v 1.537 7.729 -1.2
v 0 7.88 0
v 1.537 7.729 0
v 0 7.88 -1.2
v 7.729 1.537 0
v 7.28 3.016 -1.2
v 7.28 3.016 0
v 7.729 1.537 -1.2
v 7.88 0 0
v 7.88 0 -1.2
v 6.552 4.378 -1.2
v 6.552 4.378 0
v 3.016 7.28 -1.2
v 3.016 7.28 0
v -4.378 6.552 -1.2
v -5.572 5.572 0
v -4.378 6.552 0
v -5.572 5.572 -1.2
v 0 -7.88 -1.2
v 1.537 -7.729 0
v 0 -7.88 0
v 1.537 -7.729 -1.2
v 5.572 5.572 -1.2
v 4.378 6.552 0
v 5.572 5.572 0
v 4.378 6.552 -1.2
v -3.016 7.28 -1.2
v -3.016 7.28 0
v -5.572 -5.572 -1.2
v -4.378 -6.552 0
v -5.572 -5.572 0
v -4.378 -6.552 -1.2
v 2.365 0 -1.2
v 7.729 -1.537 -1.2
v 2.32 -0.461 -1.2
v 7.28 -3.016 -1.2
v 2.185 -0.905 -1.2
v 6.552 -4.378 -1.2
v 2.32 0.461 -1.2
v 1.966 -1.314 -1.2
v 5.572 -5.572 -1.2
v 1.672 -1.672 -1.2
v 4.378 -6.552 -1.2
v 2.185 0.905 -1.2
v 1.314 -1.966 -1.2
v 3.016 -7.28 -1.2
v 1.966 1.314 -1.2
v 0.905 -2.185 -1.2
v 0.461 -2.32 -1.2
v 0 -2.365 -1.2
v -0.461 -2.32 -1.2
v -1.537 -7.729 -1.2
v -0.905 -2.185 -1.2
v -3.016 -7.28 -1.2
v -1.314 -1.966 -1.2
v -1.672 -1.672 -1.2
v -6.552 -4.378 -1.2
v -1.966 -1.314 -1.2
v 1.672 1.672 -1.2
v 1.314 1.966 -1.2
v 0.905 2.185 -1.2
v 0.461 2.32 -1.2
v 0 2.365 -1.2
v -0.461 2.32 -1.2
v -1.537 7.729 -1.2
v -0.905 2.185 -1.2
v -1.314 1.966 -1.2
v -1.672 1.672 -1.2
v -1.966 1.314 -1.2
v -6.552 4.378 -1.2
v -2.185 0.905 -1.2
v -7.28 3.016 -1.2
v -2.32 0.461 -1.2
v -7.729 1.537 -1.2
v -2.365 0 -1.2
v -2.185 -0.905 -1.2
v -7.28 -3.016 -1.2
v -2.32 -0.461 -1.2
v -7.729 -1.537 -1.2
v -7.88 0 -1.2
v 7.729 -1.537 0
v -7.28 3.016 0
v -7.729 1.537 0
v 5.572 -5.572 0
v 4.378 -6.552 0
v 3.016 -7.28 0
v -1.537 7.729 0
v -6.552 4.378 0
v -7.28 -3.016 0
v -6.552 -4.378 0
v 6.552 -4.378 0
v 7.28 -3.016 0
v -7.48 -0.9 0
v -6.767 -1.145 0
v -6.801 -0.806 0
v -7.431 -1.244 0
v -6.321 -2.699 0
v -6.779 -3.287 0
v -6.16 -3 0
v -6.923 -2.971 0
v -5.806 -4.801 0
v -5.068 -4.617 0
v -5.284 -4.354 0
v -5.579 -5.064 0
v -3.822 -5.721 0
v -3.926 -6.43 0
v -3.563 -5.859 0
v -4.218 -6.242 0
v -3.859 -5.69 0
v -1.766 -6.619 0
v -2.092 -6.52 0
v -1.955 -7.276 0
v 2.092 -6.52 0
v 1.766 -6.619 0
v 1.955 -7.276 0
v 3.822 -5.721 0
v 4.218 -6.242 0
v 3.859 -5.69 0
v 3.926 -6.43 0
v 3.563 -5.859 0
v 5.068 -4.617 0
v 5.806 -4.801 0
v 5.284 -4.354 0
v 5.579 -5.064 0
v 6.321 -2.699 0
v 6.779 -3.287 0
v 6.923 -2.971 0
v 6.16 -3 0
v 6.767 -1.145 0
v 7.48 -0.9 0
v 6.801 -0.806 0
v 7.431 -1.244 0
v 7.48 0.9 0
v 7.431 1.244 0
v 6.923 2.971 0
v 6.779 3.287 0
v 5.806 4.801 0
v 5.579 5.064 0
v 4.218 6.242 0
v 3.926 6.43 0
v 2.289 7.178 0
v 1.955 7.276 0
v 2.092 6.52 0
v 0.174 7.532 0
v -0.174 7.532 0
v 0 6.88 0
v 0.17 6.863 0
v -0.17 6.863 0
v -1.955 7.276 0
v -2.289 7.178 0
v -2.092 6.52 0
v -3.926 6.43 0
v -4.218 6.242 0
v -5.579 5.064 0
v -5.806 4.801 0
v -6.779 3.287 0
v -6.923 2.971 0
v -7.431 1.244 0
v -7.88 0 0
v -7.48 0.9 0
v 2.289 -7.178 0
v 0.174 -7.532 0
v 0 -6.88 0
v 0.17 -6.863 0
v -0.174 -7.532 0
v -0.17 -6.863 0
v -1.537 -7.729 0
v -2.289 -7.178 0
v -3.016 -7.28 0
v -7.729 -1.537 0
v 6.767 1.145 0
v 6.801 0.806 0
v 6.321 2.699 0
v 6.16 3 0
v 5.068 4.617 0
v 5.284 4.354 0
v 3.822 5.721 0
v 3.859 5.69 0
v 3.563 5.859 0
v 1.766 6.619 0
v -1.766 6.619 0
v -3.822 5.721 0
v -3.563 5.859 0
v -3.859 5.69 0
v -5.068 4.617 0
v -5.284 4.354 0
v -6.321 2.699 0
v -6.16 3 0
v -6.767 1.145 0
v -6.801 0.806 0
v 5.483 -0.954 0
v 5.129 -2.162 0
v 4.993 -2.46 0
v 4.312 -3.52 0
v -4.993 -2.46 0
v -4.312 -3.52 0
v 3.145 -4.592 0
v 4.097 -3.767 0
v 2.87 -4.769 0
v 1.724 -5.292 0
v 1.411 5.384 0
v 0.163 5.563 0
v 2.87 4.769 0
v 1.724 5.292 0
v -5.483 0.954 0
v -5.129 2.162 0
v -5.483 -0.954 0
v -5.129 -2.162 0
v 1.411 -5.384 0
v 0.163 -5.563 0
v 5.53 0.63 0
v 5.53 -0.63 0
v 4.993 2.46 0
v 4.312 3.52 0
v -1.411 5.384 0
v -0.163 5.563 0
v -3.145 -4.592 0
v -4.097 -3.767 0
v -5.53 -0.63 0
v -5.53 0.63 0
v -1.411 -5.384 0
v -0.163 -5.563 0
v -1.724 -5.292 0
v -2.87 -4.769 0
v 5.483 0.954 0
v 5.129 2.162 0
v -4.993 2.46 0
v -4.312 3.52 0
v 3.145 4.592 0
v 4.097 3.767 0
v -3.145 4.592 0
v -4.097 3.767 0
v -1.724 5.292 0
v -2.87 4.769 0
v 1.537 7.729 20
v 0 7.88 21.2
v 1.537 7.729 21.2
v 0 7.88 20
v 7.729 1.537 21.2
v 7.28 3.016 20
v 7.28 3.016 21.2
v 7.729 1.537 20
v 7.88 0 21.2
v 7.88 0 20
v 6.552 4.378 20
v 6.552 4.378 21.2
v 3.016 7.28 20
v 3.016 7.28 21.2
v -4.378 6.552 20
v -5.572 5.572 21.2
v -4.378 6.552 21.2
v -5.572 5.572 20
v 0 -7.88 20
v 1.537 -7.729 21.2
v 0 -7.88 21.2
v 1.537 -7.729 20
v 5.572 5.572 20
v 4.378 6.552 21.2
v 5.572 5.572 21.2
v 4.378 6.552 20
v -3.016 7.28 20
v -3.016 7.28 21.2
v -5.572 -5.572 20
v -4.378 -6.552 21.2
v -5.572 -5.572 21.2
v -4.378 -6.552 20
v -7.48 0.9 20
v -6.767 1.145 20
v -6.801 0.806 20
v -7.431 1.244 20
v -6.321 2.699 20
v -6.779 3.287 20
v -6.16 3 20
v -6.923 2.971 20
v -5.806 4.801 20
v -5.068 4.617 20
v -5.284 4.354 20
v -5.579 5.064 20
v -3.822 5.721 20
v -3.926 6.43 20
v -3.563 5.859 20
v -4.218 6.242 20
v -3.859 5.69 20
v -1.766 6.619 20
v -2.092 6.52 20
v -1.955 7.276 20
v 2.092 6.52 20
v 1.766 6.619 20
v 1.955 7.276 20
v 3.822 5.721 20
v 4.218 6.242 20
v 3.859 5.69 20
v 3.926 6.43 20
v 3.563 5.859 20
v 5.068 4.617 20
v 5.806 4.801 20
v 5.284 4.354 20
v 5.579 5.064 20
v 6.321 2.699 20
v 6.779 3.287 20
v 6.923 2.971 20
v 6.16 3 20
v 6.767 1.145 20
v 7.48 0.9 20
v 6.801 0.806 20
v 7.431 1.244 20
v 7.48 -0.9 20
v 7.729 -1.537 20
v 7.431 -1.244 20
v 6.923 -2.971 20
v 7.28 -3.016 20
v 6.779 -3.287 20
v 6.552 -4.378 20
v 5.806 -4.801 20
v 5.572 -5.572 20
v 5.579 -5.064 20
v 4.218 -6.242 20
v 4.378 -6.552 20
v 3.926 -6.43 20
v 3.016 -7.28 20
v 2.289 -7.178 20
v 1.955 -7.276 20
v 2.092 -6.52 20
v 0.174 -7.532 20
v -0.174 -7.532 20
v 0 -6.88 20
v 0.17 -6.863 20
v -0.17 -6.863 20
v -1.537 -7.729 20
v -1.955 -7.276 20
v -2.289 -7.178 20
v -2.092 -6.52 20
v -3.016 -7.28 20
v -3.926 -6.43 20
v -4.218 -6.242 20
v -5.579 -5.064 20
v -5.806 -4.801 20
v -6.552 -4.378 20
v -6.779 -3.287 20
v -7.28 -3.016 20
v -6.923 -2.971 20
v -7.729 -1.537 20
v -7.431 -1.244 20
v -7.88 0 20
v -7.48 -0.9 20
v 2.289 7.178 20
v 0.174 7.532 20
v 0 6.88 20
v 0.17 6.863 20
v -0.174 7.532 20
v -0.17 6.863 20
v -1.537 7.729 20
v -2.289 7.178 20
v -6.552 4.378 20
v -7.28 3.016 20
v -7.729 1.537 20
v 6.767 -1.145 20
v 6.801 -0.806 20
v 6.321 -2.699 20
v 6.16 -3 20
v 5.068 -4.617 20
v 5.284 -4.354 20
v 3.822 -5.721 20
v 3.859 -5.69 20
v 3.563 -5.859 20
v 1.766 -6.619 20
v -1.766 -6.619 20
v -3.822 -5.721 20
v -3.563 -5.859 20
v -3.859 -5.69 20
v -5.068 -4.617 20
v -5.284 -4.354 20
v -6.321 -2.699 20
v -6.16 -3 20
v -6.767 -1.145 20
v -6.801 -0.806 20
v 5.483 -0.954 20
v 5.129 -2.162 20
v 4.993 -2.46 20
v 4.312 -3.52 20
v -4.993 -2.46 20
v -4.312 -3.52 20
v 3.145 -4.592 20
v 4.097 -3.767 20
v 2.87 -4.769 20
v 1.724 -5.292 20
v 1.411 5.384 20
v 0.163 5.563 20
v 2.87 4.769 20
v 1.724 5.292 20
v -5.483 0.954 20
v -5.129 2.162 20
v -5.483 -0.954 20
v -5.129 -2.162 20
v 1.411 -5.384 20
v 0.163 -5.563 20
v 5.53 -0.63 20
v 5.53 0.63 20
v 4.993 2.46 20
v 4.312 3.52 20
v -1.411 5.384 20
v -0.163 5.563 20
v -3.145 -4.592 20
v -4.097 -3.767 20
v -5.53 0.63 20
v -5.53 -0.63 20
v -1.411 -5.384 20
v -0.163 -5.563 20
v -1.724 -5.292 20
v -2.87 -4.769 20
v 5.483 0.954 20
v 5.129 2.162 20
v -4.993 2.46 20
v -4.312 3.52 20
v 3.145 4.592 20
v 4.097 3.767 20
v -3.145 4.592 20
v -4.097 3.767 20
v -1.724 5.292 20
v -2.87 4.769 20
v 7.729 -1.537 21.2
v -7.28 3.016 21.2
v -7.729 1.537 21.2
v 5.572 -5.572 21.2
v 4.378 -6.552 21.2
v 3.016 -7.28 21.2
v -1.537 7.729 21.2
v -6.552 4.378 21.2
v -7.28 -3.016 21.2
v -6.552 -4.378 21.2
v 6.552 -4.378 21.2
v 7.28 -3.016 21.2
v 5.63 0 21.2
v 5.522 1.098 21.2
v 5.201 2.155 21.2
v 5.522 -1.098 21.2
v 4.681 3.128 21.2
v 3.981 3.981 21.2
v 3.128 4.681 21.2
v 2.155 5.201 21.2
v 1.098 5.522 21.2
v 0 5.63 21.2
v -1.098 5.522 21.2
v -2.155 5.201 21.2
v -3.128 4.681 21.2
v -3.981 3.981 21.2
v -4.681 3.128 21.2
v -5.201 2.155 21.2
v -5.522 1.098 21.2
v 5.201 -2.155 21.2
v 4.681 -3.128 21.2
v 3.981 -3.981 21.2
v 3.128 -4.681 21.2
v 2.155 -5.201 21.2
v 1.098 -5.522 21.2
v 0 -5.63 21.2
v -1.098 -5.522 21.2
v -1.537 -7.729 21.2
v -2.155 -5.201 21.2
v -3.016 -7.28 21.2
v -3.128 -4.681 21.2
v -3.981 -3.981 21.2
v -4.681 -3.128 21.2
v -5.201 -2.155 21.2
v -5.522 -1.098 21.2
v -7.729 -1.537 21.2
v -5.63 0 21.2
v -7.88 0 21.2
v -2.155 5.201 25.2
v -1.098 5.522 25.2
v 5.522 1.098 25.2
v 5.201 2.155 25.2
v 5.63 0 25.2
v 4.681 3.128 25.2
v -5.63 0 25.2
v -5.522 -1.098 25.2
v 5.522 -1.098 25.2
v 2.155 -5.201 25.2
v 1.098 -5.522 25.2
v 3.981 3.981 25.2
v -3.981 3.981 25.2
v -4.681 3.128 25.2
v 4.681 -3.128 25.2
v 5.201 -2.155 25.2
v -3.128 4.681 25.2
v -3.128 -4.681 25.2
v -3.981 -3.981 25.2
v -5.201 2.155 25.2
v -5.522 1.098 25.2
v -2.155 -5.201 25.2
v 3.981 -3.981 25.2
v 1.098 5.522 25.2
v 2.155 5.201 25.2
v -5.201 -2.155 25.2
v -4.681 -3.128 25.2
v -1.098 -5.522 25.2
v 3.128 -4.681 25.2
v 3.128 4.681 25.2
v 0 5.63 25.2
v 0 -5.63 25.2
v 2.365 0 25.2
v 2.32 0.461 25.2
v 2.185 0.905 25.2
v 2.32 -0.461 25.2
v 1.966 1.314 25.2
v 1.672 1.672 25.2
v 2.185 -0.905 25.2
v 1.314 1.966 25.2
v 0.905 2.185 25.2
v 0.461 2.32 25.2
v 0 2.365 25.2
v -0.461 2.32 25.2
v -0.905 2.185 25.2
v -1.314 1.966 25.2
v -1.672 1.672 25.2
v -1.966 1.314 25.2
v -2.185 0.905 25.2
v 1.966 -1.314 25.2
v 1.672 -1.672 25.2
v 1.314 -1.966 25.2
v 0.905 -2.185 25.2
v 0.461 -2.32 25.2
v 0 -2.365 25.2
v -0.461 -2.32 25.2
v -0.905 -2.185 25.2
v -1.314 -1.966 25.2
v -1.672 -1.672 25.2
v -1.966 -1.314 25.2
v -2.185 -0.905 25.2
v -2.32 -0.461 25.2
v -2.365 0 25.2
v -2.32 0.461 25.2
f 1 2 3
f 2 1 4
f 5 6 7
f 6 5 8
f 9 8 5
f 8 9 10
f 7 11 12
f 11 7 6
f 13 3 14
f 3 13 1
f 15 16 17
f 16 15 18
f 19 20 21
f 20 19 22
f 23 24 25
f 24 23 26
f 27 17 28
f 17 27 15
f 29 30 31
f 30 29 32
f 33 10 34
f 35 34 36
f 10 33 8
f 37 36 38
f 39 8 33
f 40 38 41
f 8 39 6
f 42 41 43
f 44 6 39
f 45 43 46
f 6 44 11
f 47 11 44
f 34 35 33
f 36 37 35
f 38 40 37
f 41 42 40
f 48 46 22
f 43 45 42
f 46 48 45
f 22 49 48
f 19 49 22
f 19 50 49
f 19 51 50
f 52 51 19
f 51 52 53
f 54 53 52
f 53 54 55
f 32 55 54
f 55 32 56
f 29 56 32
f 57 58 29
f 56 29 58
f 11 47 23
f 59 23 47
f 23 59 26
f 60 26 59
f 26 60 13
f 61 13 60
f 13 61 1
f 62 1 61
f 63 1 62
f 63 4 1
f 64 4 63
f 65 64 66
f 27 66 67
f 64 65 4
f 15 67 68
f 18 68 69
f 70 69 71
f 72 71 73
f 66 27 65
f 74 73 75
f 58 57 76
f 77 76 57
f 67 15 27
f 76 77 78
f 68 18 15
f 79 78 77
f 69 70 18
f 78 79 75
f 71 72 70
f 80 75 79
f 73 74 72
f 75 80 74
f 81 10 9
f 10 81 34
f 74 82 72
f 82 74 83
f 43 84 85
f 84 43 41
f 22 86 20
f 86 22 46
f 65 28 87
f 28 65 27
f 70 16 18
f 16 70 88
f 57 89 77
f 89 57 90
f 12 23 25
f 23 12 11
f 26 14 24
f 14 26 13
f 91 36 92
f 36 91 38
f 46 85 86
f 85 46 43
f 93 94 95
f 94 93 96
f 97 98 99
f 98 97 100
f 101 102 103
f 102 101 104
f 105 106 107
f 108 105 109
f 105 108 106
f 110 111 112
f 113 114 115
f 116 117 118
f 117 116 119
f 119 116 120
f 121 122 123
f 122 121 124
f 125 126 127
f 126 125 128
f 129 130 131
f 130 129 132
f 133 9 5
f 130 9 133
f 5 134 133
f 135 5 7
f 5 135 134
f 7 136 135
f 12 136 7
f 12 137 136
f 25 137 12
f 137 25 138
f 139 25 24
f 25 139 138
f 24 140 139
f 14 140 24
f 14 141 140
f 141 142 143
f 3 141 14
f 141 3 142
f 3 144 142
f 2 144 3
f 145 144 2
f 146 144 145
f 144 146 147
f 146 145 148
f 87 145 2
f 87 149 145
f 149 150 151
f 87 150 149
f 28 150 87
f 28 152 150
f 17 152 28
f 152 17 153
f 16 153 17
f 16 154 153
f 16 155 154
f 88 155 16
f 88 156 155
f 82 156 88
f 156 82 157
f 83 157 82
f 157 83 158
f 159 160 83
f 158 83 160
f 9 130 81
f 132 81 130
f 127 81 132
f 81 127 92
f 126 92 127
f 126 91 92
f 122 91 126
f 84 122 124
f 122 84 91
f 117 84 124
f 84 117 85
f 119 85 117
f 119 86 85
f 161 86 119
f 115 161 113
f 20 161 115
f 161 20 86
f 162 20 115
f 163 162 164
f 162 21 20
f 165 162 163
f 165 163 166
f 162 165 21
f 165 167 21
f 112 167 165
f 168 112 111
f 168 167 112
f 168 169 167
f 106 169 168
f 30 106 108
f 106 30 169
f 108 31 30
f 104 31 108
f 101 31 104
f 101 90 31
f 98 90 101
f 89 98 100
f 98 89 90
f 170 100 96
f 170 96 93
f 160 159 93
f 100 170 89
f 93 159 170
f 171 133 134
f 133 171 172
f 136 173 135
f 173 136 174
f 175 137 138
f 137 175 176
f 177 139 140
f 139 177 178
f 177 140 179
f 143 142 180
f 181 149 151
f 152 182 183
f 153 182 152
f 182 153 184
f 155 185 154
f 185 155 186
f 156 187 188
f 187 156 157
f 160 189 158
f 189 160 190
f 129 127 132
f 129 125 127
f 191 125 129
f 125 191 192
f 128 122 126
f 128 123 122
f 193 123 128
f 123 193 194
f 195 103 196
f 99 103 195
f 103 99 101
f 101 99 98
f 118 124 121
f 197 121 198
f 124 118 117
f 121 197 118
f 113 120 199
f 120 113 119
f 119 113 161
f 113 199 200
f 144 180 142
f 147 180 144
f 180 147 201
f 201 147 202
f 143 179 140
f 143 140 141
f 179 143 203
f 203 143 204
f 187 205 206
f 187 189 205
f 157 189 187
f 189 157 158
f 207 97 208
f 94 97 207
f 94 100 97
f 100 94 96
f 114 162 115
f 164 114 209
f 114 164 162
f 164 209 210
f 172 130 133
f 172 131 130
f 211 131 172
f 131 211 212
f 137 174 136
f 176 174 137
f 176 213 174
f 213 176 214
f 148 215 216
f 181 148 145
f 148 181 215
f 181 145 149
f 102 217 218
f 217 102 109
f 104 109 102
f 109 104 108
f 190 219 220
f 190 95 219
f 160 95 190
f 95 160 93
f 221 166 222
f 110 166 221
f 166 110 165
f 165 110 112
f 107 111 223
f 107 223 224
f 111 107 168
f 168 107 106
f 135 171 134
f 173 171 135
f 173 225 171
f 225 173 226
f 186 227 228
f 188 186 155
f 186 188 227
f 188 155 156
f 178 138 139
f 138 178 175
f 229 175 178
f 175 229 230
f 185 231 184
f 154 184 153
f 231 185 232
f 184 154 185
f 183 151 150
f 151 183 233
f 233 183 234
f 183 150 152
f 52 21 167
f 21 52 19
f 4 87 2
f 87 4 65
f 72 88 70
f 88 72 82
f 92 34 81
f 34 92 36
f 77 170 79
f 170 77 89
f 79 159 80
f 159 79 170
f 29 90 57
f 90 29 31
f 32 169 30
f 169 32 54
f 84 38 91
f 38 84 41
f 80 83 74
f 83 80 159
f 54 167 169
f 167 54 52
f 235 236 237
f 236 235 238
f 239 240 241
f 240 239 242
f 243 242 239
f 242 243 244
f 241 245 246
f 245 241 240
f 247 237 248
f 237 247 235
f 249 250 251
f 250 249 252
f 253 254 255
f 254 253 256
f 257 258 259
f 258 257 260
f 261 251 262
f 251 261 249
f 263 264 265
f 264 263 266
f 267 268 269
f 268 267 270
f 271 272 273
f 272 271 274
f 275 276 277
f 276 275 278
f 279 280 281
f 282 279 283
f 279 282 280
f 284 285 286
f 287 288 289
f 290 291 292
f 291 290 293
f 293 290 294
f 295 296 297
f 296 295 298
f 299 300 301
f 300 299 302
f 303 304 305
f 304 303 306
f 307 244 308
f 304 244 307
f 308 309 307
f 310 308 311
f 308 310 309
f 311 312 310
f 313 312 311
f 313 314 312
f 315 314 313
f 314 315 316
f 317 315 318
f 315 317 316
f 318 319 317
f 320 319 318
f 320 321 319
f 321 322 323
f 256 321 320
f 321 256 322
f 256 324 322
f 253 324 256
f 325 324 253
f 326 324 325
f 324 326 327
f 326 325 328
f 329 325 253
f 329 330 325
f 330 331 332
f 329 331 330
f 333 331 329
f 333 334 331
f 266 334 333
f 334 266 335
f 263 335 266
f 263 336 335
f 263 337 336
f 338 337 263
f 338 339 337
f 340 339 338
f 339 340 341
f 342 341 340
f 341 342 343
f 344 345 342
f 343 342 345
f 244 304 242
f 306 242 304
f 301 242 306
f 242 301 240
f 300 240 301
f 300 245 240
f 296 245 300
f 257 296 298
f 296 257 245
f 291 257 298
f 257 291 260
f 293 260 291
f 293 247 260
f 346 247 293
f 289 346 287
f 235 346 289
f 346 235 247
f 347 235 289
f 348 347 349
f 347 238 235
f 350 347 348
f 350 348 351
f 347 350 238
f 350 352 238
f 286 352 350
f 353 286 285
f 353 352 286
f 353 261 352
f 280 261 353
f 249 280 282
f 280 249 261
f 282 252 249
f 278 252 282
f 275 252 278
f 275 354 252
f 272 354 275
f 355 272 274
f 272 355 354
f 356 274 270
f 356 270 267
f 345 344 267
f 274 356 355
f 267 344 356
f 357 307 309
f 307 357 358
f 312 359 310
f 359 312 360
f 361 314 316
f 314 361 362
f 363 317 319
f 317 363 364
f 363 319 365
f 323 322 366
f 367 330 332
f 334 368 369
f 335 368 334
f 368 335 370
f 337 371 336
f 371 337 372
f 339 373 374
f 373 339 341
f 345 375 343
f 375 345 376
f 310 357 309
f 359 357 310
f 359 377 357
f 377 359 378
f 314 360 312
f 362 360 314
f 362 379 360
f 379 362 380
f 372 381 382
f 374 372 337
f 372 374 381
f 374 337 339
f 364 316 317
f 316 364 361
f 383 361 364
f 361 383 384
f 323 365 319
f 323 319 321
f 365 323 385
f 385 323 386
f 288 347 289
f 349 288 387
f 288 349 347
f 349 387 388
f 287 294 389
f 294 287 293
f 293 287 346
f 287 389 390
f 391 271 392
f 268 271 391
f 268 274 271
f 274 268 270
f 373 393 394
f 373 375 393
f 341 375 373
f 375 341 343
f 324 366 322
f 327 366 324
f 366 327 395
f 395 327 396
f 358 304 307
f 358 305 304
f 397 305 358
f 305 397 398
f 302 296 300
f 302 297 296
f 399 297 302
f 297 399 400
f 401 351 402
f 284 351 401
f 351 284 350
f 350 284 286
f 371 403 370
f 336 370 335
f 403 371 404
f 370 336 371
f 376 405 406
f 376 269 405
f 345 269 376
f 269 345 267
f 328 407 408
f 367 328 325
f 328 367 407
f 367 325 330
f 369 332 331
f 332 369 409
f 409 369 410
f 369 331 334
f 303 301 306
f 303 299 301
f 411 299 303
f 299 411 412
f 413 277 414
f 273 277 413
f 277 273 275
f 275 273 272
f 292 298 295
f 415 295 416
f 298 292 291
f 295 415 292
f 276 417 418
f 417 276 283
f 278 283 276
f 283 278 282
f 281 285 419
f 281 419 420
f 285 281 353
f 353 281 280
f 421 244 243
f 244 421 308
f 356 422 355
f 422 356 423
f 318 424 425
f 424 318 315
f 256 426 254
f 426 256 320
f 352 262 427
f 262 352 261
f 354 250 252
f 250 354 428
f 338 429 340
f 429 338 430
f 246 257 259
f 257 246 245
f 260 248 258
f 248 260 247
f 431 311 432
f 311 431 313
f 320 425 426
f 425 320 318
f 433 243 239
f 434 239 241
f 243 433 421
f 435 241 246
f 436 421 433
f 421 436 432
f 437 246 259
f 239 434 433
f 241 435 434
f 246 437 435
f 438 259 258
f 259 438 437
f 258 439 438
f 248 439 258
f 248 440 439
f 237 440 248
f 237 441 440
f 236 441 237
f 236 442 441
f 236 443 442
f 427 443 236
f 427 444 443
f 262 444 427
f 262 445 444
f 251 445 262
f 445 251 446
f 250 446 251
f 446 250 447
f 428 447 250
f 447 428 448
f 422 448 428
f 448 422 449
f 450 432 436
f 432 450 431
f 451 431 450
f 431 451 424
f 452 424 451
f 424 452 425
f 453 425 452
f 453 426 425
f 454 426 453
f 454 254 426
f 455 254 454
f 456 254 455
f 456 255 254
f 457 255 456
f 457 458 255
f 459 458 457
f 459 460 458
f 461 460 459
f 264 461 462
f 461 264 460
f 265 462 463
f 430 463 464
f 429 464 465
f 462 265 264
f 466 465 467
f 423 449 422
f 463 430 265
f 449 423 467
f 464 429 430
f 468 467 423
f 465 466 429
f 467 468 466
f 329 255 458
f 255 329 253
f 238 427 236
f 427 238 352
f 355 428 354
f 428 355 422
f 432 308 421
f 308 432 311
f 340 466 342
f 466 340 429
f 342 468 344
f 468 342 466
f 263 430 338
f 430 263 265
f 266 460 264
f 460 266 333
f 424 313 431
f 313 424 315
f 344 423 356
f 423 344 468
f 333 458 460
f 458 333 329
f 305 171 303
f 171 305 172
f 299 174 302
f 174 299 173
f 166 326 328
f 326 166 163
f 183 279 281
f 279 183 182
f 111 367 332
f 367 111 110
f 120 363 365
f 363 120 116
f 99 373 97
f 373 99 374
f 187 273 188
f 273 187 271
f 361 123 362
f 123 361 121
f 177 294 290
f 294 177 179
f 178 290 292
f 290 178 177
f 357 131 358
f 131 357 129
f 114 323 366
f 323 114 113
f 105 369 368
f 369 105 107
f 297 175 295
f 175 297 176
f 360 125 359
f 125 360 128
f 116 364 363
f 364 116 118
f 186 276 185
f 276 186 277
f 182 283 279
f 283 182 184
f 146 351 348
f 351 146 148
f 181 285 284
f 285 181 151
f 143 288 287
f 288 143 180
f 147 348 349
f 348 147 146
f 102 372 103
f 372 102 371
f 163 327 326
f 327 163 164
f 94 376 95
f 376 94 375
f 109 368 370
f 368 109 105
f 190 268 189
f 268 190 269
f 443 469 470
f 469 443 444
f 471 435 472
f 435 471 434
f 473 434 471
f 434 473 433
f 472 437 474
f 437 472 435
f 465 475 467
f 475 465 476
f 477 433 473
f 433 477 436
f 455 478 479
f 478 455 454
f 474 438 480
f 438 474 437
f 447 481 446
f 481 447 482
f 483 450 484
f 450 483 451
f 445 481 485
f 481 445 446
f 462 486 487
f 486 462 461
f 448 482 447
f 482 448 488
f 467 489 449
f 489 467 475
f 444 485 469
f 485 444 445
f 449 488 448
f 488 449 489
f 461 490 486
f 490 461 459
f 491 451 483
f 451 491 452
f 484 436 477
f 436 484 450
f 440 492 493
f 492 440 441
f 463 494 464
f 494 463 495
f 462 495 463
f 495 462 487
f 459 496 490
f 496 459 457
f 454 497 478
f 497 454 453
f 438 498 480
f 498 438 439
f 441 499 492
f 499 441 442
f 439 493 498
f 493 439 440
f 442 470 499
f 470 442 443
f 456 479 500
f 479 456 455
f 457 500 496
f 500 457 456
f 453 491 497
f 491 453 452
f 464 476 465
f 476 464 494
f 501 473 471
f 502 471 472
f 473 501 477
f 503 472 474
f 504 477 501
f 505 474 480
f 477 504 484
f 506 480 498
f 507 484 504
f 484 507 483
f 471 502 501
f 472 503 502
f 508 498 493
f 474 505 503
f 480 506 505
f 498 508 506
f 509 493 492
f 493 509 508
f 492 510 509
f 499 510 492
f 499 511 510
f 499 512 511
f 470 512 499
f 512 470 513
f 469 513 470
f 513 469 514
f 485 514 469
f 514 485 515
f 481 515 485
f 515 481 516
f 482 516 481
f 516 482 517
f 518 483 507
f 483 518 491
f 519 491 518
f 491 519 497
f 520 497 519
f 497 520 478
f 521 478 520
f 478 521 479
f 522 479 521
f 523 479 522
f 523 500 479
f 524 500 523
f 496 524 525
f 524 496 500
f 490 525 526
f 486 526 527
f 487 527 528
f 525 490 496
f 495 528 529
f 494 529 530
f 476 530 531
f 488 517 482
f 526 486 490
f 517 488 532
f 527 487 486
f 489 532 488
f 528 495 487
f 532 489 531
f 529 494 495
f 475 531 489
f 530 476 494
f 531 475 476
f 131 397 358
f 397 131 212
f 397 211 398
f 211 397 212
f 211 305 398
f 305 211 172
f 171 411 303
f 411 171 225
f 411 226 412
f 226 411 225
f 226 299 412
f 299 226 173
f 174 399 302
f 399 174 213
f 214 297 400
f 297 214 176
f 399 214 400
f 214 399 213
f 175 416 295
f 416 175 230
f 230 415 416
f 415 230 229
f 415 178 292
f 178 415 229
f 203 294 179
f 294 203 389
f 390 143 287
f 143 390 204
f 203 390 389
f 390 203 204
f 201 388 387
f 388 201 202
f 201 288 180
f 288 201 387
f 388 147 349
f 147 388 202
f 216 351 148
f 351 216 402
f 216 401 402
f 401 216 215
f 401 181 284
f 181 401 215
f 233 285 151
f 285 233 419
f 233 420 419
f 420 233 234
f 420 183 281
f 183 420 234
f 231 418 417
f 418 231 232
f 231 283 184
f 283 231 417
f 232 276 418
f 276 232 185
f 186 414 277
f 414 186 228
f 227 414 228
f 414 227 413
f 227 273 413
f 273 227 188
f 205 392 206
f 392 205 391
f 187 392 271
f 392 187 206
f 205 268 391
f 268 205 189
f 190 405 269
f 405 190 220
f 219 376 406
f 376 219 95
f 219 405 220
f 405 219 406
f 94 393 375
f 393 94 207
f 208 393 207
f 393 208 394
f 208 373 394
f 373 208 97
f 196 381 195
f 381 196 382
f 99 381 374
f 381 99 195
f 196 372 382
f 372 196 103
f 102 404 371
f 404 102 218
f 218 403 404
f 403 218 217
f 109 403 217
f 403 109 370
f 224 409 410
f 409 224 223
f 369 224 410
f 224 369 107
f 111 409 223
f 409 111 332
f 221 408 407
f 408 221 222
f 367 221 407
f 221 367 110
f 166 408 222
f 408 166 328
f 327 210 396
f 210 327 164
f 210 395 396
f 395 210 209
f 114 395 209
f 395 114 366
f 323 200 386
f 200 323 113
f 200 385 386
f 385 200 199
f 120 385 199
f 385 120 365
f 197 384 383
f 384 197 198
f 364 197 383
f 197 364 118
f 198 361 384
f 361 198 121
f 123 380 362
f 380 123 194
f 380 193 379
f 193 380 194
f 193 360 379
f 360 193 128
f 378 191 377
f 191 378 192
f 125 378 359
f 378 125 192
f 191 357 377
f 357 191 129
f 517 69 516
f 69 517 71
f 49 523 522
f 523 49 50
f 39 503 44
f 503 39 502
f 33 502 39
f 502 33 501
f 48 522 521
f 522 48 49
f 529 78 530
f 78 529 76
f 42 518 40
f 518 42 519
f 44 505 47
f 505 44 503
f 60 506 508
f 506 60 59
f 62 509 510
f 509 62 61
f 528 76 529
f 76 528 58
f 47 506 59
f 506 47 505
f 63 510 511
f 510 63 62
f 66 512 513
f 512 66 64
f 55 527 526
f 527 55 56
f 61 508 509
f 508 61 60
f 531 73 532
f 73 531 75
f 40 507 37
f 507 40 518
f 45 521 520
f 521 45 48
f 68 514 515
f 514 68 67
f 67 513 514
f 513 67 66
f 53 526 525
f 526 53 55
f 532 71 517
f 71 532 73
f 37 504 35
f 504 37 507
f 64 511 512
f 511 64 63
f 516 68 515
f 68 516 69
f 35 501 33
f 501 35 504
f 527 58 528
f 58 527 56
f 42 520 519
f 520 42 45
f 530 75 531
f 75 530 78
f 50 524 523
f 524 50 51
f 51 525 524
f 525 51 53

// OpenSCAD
$fn = 32;

// ----------------------------------------------------------------------
// Timing pulley: GT2 22T, pitch 2 mm, 15.76 mm x 26.4 mm
// ----------------------------------------------------------------------

// --- parameters (mm) ---
pitch_mm = 2;             // belt pitch
tooth_count = 22;         // number of grooves
width = 20;               // belt width between the flanges
tip_d = 13.76;            // tip circle diameter
root_d = 12.26;           // groove bottom diameter
groove_h = 0.75;          // groove depth
tooth_w = 1.5;            // groove width at the tip circle
side_d = 15.76;           // flange diameter
side_t = 1.2;             // flange thickness
spigot_d = 10.66;         // flange spigot, sunk into the rim
spigot_h = 1.2;           // spigot depth into the rim
hub_bore = 4.73;          // shaft bore
hub_d = 11.26;            // hub diameter
hub_h = 4;                // hub above the flange
bottom_z = -1.2;          // lowest point of the pulley
top_z = 25.2;             // highest point of the pulley

module rim() {
  cylinder(h = width, d = tip_d);
}

module groove_cutter() {
  /* belt tooth groove: deeper than wide, cut through the belt width */
  translate([root_d / 2, 0, 0])
    linear_extrude(height = width)
      polygon(points = [[-0.6, -tooth_w * 0.42], [groove_h + 0.6, -tooth_w * 0.6],
                        [groove_h + 0.6, tooth_w * 0.6], [-0.6, tooth_w * 0.42]]);
}

module flanges() {
  translate([0, 0, -side_t]) cylinder(h = side_t, d = side_d);
  translate([0, 0, width]) cylinder(h = side_t, d = side_d);
  translate([0, 0, -spigot_h]) cylinder(h = spigot_h + 0.6, d = spigot_d);
  translate([0, 0, width - 0.6]) cylinder(h = spigot_h + 0.6, d = spigot_d);
}

module hub() {
  translate([0, 0, bottom_z]) cylinder(h = top_z - bottom_z, d = hub_d);
}

difference() {
  union() {
    rim();
    hub();
    flanges();
  }
  for (i = [0 : tooth_count - 1]) rotate([0, 0, i * 360 / tooth_count]) groove_cutter();
  translate([0, 0, bottom_z - 1]) cylinder(h = top_z - bottom_z + 2, d = hub_bore);
}
